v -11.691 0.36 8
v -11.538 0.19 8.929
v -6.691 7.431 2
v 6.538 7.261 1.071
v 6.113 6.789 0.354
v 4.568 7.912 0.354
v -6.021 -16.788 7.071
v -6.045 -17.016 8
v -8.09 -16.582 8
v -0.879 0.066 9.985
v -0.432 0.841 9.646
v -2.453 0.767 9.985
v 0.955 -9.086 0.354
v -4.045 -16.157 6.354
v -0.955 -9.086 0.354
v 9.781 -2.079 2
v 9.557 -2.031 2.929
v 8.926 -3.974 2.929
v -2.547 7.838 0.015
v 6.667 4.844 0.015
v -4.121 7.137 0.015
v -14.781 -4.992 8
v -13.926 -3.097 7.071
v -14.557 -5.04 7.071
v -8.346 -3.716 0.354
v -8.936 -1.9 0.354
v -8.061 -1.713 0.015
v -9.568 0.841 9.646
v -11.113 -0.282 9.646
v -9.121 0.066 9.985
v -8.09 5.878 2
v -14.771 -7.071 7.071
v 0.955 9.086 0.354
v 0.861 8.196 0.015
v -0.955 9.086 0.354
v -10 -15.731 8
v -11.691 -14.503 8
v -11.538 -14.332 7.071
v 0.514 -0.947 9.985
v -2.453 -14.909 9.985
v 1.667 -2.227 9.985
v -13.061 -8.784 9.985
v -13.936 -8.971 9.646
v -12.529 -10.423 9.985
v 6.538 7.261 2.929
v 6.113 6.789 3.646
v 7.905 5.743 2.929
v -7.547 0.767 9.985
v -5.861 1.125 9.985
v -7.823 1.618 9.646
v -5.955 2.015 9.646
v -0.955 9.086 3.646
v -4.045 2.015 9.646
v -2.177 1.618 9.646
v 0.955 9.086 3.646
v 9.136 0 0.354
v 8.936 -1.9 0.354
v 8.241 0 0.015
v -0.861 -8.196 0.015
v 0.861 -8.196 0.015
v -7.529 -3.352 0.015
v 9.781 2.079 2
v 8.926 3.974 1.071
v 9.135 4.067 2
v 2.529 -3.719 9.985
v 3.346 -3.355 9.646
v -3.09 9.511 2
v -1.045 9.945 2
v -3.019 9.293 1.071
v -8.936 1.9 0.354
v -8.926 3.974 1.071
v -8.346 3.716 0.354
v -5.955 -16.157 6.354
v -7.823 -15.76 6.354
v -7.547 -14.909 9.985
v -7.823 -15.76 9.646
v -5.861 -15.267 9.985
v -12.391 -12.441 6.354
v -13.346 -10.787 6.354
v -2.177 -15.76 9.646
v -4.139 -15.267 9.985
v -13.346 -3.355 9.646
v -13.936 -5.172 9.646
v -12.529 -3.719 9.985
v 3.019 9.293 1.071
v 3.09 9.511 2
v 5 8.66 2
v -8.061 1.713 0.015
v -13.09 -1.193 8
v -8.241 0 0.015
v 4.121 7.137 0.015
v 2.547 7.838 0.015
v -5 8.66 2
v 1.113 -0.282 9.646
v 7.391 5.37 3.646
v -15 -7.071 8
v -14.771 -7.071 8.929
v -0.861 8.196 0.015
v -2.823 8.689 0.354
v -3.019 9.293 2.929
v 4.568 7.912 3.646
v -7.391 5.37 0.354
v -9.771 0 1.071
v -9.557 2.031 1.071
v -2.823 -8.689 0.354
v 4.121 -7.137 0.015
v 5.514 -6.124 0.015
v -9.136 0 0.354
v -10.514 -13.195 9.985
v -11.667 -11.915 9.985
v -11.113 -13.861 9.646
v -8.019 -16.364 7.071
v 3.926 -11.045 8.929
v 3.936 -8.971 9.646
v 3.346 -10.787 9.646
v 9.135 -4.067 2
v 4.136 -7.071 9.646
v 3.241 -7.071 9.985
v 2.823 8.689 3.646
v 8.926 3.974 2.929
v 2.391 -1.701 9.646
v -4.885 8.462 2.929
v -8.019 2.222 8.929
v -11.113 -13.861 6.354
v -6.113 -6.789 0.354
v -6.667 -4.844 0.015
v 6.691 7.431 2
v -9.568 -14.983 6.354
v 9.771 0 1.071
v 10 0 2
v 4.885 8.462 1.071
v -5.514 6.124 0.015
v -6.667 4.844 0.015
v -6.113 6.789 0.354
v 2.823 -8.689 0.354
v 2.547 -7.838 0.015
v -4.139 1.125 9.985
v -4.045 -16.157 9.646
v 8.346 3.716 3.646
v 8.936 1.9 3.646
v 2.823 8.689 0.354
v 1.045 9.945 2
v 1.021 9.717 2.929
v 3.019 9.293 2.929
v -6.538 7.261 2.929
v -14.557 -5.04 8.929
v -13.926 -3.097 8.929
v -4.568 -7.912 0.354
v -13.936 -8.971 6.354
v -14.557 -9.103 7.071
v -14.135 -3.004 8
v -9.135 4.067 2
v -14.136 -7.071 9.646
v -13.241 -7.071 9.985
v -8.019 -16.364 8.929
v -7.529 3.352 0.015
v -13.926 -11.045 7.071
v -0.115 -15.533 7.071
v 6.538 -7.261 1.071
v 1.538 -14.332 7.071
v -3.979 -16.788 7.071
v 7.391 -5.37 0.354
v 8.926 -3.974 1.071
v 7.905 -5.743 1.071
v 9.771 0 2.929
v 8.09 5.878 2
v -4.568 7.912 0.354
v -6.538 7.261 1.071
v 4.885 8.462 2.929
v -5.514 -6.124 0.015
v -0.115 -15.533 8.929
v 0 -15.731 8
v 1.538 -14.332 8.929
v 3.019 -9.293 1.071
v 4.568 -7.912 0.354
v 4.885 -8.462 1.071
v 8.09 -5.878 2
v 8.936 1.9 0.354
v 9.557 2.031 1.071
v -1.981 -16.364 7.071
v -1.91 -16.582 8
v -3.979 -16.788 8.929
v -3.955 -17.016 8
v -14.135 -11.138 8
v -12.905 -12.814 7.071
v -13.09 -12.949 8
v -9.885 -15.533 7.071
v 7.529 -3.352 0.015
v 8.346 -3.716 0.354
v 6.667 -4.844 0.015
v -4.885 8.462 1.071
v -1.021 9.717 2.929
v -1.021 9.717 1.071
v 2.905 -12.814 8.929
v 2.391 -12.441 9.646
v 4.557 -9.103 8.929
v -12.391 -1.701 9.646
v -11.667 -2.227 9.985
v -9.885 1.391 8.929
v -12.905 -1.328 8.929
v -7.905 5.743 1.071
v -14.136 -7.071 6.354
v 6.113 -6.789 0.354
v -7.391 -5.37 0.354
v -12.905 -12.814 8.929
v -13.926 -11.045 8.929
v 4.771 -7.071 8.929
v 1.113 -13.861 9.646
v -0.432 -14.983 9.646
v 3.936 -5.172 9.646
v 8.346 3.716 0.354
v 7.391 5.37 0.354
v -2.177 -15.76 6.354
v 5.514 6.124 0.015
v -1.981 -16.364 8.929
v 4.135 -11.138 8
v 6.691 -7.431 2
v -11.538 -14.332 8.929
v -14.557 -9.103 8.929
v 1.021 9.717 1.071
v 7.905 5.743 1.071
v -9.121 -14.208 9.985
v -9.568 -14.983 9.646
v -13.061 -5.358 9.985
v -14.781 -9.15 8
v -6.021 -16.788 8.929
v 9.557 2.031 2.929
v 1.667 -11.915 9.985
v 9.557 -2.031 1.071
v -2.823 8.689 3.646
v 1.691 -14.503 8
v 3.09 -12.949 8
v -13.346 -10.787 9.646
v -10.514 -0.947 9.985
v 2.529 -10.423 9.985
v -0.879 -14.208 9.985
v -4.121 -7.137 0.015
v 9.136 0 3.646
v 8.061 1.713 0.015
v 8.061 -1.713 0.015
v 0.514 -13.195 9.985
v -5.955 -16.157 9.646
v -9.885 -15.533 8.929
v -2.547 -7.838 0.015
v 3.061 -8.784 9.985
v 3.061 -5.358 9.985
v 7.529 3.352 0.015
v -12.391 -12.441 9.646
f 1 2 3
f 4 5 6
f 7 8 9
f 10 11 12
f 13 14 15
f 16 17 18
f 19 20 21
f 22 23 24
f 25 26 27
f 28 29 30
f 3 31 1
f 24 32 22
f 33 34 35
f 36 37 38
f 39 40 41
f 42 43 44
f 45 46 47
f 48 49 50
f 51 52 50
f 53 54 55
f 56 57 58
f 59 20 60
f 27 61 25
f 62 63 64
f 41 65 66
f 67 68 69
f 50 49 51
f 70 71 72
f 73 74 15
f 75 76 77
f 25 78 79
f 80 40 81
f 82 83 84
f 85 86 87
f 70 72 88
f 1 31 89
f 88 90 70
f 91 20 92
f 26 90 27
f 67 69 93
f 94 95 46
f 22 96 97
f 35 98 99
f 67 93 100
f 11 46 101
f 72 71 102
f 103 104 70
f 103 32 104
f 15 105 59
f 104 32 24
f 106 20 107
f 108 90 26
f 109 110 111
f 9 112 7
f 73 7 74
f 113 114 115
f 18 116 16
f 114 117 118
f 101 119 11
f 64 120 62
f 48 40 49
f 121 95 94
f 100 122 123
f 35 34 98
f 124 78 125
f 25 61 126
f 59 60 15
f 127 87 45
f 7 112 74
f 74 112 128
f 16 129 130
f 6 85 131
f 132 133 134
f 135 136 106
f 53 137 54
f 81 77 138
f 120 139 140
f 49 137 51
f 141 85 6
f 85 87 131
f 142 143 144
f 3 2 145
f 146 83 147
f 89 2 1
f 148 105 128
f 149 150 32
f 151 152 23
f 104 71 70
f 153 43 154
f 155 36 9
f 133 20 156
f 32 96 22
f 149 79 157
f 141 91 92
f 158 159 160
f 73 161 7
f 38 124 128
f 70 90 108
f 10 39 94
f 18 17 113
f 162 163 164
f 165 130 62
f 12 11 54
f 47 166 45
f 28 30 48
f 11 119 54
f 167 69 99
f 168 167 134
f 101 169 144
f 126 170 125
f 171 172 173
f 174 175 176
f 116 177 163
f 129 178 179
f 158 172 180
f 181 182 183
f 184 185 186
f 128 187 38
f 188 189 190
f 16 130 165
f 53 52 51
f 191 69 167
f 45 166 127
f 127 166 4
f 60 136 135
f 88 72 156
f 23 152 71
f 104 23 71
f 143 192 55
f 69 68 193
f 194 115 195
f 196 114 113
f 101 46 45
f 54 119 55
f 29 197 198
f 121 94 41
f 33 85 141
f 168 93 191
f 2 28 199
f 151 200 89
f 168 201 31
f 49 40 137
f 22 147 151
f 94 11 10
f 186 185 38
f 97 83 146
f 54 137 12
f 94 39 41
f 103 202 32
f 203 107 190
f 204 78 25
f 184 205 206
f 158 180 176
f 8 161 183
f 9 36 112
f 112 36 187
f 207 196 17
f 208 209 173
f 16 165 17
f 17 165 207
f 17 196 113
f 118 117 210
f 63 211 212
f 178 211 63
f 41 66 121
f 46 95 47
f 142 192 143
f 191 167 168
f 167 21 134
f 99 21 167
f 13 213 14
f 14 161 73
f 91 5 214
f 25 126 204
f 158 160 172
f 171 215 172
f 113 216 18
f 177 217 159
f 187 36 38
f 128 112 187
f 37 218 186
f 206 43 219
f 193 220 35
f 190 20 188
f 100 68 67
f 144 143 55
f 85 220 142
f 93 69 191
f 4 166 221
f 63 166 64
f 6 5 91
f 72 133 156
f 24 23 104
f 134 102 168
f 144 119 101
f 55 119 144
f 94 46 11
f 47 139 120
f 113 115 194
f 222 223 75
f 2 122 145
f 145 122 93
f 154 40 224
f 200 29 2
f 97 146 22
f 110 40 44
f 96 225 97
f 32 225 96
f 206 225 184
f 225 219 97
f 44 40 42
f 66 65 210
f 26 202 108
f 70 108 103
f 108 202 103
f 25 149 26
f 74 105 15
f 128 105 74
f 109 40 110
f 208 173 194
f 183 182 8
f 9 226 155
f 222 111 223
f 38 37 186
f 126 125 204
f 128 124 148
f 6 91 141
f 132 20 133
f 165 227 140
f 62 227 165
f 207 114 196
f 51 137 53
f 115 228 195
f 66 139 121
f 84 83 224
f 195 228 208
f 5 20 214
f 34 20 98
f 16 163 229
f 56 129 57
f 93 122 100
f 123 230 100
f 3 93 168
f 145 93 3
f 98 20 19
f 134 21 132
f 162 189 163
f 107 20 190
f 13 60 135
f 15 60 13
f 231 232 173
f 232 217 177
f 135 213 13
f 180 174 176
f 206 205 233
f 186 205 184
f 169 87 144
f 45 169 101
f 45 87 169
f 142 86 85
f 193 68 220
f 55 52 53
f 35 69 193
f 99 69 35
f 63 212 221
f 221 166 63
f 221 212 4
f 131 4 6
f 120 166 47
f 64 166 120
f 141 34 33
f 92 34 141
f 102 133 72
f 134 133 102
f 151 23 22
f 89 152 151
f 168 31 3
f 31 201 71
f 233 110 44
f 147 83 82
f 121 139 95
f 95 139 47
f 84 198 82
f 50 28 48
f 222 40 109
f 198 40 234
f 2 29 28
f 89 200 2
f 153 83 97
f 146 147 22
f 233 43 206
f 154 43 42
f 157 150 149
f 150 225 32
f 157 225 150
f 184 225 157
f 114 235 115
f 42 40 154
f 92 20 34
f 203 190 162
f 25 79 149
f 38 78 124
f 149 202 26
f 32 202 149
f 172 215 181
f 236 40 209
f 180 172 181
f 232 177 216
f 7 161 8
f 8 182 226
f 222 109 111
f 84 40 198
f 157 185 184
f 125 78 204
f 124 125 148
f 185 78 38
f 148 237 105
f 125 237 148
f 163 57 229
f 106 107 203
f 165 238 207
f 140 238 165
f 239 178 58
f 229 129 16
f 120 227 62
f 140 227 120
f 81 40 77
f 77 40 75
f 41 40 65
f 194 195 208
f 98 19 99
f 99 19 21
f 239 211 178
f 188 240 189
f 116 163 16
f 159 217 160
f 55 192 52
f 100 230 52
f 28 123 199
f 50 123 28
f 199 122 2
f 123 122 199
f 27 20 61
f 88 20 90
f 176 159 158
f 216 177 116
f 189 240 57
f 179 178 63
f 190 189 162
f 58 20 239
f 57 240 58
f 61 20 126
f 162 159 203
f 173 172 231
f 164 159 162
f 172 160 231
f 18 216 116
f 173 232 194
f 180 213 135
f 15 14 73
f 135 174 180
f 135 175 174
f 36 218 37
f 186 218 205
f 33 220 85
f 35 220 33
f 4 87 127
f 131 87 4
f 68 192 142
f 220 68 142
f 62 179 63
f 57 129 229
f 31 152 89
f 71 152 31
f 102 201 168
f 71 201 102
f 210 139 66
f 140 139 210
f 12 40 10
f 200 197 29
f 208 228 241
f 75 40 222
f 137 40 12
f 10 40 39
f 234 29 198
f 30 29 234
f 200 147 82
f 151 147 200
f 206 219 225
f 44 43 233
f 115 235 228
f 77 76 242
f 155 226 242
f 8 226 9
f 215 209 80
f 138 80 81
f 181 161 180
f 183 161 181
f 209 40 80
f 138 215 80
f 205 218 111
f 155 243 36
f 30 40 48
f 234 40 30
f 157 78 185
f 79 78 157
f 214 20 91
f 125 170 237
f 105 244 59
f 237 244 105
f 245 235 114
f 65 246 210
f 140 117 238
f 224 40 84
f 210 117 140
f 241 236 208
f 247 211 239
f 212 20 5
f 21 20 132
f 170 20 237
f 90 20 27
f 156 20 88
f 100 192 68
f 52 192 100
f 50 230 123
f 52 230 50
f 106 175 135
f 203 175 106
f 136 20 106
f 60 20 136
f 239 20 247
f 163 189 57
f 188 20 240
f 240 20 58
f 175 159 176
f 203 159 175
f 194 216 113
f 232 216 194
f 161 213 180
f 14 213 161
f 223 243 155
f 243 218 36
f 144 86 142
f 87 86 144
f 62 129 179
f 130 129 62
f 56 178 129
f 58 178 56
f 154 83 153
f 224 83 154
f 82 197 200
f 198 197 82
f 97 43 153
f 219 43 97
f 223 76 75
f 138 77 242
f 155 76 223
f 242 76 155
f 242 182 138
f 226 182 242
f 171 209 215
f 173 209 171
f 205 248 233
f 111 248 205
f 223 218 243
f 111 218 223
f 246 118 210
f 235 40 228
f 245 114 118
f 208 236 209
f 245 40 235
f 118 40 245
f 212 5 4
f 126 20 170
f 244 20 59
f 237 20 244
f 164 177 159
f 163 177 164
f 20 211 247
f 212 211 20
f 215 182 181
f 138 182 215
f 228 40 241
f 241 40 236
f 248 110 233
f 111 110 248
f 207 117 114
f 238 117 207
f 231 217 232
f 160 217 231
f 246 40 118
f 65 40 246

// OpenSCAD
module scube(size= [20,20,20],
                        sheer = [0,0],
                        b=2,
                        center=false) 
{
    hull() 
   {
        assign(sheer_offset =
                   [size[2] * sin(sheer[0]), size[2] * sin(sheer[1]), 0 ])
        assign(round_offset = [b,b,b])
        assign(isize = 
                   center ? [- (size +sheer_offset)/2 + round_offset, 
                                    (size )/2 - round_offset]
                               : [ [0,0,0] + round_offset, size - round_offset]
                   ) 
        {
            for (x=[0,1])
            for (y=[0,1]) 
               {
                    translate ([isize[x][0], isize[y][1], isize[0][2]]) sphere(b);
                    translate ([isize[x][0] + sheer_offset[0],
                                     isize[y][1] + sheer_offset[1],
                                     isize[1][2]])  sphere(b);
               }
        }
    }
}

module scylinder(r1=10,r2=10,h=10, b=2,
                             sheer = [0,0], center=false)
{
    assign(sheer_offset = [h * sin(sheer[0]), h * sin(sheer[1]), 0 ])
    assign(z_offset = center ? - h/2 : 0 ) 
    translate([0, 0, z_offset])
    hull()
    {
           rotate_extrude()
                 translate([r1-b, b, 0]) 
                      circle(r = b); 
           translate(sheer_offset)
                rotate_extrude() 
                     translate([r2-b, h-b, 0]) 
                          circle(r = b);
    }
}

$fs=1;
*scube(size=[15,20,25], sheer=[30,45], center=false,b=2);

scylinder( sheer=[-30,-45], center=false);
